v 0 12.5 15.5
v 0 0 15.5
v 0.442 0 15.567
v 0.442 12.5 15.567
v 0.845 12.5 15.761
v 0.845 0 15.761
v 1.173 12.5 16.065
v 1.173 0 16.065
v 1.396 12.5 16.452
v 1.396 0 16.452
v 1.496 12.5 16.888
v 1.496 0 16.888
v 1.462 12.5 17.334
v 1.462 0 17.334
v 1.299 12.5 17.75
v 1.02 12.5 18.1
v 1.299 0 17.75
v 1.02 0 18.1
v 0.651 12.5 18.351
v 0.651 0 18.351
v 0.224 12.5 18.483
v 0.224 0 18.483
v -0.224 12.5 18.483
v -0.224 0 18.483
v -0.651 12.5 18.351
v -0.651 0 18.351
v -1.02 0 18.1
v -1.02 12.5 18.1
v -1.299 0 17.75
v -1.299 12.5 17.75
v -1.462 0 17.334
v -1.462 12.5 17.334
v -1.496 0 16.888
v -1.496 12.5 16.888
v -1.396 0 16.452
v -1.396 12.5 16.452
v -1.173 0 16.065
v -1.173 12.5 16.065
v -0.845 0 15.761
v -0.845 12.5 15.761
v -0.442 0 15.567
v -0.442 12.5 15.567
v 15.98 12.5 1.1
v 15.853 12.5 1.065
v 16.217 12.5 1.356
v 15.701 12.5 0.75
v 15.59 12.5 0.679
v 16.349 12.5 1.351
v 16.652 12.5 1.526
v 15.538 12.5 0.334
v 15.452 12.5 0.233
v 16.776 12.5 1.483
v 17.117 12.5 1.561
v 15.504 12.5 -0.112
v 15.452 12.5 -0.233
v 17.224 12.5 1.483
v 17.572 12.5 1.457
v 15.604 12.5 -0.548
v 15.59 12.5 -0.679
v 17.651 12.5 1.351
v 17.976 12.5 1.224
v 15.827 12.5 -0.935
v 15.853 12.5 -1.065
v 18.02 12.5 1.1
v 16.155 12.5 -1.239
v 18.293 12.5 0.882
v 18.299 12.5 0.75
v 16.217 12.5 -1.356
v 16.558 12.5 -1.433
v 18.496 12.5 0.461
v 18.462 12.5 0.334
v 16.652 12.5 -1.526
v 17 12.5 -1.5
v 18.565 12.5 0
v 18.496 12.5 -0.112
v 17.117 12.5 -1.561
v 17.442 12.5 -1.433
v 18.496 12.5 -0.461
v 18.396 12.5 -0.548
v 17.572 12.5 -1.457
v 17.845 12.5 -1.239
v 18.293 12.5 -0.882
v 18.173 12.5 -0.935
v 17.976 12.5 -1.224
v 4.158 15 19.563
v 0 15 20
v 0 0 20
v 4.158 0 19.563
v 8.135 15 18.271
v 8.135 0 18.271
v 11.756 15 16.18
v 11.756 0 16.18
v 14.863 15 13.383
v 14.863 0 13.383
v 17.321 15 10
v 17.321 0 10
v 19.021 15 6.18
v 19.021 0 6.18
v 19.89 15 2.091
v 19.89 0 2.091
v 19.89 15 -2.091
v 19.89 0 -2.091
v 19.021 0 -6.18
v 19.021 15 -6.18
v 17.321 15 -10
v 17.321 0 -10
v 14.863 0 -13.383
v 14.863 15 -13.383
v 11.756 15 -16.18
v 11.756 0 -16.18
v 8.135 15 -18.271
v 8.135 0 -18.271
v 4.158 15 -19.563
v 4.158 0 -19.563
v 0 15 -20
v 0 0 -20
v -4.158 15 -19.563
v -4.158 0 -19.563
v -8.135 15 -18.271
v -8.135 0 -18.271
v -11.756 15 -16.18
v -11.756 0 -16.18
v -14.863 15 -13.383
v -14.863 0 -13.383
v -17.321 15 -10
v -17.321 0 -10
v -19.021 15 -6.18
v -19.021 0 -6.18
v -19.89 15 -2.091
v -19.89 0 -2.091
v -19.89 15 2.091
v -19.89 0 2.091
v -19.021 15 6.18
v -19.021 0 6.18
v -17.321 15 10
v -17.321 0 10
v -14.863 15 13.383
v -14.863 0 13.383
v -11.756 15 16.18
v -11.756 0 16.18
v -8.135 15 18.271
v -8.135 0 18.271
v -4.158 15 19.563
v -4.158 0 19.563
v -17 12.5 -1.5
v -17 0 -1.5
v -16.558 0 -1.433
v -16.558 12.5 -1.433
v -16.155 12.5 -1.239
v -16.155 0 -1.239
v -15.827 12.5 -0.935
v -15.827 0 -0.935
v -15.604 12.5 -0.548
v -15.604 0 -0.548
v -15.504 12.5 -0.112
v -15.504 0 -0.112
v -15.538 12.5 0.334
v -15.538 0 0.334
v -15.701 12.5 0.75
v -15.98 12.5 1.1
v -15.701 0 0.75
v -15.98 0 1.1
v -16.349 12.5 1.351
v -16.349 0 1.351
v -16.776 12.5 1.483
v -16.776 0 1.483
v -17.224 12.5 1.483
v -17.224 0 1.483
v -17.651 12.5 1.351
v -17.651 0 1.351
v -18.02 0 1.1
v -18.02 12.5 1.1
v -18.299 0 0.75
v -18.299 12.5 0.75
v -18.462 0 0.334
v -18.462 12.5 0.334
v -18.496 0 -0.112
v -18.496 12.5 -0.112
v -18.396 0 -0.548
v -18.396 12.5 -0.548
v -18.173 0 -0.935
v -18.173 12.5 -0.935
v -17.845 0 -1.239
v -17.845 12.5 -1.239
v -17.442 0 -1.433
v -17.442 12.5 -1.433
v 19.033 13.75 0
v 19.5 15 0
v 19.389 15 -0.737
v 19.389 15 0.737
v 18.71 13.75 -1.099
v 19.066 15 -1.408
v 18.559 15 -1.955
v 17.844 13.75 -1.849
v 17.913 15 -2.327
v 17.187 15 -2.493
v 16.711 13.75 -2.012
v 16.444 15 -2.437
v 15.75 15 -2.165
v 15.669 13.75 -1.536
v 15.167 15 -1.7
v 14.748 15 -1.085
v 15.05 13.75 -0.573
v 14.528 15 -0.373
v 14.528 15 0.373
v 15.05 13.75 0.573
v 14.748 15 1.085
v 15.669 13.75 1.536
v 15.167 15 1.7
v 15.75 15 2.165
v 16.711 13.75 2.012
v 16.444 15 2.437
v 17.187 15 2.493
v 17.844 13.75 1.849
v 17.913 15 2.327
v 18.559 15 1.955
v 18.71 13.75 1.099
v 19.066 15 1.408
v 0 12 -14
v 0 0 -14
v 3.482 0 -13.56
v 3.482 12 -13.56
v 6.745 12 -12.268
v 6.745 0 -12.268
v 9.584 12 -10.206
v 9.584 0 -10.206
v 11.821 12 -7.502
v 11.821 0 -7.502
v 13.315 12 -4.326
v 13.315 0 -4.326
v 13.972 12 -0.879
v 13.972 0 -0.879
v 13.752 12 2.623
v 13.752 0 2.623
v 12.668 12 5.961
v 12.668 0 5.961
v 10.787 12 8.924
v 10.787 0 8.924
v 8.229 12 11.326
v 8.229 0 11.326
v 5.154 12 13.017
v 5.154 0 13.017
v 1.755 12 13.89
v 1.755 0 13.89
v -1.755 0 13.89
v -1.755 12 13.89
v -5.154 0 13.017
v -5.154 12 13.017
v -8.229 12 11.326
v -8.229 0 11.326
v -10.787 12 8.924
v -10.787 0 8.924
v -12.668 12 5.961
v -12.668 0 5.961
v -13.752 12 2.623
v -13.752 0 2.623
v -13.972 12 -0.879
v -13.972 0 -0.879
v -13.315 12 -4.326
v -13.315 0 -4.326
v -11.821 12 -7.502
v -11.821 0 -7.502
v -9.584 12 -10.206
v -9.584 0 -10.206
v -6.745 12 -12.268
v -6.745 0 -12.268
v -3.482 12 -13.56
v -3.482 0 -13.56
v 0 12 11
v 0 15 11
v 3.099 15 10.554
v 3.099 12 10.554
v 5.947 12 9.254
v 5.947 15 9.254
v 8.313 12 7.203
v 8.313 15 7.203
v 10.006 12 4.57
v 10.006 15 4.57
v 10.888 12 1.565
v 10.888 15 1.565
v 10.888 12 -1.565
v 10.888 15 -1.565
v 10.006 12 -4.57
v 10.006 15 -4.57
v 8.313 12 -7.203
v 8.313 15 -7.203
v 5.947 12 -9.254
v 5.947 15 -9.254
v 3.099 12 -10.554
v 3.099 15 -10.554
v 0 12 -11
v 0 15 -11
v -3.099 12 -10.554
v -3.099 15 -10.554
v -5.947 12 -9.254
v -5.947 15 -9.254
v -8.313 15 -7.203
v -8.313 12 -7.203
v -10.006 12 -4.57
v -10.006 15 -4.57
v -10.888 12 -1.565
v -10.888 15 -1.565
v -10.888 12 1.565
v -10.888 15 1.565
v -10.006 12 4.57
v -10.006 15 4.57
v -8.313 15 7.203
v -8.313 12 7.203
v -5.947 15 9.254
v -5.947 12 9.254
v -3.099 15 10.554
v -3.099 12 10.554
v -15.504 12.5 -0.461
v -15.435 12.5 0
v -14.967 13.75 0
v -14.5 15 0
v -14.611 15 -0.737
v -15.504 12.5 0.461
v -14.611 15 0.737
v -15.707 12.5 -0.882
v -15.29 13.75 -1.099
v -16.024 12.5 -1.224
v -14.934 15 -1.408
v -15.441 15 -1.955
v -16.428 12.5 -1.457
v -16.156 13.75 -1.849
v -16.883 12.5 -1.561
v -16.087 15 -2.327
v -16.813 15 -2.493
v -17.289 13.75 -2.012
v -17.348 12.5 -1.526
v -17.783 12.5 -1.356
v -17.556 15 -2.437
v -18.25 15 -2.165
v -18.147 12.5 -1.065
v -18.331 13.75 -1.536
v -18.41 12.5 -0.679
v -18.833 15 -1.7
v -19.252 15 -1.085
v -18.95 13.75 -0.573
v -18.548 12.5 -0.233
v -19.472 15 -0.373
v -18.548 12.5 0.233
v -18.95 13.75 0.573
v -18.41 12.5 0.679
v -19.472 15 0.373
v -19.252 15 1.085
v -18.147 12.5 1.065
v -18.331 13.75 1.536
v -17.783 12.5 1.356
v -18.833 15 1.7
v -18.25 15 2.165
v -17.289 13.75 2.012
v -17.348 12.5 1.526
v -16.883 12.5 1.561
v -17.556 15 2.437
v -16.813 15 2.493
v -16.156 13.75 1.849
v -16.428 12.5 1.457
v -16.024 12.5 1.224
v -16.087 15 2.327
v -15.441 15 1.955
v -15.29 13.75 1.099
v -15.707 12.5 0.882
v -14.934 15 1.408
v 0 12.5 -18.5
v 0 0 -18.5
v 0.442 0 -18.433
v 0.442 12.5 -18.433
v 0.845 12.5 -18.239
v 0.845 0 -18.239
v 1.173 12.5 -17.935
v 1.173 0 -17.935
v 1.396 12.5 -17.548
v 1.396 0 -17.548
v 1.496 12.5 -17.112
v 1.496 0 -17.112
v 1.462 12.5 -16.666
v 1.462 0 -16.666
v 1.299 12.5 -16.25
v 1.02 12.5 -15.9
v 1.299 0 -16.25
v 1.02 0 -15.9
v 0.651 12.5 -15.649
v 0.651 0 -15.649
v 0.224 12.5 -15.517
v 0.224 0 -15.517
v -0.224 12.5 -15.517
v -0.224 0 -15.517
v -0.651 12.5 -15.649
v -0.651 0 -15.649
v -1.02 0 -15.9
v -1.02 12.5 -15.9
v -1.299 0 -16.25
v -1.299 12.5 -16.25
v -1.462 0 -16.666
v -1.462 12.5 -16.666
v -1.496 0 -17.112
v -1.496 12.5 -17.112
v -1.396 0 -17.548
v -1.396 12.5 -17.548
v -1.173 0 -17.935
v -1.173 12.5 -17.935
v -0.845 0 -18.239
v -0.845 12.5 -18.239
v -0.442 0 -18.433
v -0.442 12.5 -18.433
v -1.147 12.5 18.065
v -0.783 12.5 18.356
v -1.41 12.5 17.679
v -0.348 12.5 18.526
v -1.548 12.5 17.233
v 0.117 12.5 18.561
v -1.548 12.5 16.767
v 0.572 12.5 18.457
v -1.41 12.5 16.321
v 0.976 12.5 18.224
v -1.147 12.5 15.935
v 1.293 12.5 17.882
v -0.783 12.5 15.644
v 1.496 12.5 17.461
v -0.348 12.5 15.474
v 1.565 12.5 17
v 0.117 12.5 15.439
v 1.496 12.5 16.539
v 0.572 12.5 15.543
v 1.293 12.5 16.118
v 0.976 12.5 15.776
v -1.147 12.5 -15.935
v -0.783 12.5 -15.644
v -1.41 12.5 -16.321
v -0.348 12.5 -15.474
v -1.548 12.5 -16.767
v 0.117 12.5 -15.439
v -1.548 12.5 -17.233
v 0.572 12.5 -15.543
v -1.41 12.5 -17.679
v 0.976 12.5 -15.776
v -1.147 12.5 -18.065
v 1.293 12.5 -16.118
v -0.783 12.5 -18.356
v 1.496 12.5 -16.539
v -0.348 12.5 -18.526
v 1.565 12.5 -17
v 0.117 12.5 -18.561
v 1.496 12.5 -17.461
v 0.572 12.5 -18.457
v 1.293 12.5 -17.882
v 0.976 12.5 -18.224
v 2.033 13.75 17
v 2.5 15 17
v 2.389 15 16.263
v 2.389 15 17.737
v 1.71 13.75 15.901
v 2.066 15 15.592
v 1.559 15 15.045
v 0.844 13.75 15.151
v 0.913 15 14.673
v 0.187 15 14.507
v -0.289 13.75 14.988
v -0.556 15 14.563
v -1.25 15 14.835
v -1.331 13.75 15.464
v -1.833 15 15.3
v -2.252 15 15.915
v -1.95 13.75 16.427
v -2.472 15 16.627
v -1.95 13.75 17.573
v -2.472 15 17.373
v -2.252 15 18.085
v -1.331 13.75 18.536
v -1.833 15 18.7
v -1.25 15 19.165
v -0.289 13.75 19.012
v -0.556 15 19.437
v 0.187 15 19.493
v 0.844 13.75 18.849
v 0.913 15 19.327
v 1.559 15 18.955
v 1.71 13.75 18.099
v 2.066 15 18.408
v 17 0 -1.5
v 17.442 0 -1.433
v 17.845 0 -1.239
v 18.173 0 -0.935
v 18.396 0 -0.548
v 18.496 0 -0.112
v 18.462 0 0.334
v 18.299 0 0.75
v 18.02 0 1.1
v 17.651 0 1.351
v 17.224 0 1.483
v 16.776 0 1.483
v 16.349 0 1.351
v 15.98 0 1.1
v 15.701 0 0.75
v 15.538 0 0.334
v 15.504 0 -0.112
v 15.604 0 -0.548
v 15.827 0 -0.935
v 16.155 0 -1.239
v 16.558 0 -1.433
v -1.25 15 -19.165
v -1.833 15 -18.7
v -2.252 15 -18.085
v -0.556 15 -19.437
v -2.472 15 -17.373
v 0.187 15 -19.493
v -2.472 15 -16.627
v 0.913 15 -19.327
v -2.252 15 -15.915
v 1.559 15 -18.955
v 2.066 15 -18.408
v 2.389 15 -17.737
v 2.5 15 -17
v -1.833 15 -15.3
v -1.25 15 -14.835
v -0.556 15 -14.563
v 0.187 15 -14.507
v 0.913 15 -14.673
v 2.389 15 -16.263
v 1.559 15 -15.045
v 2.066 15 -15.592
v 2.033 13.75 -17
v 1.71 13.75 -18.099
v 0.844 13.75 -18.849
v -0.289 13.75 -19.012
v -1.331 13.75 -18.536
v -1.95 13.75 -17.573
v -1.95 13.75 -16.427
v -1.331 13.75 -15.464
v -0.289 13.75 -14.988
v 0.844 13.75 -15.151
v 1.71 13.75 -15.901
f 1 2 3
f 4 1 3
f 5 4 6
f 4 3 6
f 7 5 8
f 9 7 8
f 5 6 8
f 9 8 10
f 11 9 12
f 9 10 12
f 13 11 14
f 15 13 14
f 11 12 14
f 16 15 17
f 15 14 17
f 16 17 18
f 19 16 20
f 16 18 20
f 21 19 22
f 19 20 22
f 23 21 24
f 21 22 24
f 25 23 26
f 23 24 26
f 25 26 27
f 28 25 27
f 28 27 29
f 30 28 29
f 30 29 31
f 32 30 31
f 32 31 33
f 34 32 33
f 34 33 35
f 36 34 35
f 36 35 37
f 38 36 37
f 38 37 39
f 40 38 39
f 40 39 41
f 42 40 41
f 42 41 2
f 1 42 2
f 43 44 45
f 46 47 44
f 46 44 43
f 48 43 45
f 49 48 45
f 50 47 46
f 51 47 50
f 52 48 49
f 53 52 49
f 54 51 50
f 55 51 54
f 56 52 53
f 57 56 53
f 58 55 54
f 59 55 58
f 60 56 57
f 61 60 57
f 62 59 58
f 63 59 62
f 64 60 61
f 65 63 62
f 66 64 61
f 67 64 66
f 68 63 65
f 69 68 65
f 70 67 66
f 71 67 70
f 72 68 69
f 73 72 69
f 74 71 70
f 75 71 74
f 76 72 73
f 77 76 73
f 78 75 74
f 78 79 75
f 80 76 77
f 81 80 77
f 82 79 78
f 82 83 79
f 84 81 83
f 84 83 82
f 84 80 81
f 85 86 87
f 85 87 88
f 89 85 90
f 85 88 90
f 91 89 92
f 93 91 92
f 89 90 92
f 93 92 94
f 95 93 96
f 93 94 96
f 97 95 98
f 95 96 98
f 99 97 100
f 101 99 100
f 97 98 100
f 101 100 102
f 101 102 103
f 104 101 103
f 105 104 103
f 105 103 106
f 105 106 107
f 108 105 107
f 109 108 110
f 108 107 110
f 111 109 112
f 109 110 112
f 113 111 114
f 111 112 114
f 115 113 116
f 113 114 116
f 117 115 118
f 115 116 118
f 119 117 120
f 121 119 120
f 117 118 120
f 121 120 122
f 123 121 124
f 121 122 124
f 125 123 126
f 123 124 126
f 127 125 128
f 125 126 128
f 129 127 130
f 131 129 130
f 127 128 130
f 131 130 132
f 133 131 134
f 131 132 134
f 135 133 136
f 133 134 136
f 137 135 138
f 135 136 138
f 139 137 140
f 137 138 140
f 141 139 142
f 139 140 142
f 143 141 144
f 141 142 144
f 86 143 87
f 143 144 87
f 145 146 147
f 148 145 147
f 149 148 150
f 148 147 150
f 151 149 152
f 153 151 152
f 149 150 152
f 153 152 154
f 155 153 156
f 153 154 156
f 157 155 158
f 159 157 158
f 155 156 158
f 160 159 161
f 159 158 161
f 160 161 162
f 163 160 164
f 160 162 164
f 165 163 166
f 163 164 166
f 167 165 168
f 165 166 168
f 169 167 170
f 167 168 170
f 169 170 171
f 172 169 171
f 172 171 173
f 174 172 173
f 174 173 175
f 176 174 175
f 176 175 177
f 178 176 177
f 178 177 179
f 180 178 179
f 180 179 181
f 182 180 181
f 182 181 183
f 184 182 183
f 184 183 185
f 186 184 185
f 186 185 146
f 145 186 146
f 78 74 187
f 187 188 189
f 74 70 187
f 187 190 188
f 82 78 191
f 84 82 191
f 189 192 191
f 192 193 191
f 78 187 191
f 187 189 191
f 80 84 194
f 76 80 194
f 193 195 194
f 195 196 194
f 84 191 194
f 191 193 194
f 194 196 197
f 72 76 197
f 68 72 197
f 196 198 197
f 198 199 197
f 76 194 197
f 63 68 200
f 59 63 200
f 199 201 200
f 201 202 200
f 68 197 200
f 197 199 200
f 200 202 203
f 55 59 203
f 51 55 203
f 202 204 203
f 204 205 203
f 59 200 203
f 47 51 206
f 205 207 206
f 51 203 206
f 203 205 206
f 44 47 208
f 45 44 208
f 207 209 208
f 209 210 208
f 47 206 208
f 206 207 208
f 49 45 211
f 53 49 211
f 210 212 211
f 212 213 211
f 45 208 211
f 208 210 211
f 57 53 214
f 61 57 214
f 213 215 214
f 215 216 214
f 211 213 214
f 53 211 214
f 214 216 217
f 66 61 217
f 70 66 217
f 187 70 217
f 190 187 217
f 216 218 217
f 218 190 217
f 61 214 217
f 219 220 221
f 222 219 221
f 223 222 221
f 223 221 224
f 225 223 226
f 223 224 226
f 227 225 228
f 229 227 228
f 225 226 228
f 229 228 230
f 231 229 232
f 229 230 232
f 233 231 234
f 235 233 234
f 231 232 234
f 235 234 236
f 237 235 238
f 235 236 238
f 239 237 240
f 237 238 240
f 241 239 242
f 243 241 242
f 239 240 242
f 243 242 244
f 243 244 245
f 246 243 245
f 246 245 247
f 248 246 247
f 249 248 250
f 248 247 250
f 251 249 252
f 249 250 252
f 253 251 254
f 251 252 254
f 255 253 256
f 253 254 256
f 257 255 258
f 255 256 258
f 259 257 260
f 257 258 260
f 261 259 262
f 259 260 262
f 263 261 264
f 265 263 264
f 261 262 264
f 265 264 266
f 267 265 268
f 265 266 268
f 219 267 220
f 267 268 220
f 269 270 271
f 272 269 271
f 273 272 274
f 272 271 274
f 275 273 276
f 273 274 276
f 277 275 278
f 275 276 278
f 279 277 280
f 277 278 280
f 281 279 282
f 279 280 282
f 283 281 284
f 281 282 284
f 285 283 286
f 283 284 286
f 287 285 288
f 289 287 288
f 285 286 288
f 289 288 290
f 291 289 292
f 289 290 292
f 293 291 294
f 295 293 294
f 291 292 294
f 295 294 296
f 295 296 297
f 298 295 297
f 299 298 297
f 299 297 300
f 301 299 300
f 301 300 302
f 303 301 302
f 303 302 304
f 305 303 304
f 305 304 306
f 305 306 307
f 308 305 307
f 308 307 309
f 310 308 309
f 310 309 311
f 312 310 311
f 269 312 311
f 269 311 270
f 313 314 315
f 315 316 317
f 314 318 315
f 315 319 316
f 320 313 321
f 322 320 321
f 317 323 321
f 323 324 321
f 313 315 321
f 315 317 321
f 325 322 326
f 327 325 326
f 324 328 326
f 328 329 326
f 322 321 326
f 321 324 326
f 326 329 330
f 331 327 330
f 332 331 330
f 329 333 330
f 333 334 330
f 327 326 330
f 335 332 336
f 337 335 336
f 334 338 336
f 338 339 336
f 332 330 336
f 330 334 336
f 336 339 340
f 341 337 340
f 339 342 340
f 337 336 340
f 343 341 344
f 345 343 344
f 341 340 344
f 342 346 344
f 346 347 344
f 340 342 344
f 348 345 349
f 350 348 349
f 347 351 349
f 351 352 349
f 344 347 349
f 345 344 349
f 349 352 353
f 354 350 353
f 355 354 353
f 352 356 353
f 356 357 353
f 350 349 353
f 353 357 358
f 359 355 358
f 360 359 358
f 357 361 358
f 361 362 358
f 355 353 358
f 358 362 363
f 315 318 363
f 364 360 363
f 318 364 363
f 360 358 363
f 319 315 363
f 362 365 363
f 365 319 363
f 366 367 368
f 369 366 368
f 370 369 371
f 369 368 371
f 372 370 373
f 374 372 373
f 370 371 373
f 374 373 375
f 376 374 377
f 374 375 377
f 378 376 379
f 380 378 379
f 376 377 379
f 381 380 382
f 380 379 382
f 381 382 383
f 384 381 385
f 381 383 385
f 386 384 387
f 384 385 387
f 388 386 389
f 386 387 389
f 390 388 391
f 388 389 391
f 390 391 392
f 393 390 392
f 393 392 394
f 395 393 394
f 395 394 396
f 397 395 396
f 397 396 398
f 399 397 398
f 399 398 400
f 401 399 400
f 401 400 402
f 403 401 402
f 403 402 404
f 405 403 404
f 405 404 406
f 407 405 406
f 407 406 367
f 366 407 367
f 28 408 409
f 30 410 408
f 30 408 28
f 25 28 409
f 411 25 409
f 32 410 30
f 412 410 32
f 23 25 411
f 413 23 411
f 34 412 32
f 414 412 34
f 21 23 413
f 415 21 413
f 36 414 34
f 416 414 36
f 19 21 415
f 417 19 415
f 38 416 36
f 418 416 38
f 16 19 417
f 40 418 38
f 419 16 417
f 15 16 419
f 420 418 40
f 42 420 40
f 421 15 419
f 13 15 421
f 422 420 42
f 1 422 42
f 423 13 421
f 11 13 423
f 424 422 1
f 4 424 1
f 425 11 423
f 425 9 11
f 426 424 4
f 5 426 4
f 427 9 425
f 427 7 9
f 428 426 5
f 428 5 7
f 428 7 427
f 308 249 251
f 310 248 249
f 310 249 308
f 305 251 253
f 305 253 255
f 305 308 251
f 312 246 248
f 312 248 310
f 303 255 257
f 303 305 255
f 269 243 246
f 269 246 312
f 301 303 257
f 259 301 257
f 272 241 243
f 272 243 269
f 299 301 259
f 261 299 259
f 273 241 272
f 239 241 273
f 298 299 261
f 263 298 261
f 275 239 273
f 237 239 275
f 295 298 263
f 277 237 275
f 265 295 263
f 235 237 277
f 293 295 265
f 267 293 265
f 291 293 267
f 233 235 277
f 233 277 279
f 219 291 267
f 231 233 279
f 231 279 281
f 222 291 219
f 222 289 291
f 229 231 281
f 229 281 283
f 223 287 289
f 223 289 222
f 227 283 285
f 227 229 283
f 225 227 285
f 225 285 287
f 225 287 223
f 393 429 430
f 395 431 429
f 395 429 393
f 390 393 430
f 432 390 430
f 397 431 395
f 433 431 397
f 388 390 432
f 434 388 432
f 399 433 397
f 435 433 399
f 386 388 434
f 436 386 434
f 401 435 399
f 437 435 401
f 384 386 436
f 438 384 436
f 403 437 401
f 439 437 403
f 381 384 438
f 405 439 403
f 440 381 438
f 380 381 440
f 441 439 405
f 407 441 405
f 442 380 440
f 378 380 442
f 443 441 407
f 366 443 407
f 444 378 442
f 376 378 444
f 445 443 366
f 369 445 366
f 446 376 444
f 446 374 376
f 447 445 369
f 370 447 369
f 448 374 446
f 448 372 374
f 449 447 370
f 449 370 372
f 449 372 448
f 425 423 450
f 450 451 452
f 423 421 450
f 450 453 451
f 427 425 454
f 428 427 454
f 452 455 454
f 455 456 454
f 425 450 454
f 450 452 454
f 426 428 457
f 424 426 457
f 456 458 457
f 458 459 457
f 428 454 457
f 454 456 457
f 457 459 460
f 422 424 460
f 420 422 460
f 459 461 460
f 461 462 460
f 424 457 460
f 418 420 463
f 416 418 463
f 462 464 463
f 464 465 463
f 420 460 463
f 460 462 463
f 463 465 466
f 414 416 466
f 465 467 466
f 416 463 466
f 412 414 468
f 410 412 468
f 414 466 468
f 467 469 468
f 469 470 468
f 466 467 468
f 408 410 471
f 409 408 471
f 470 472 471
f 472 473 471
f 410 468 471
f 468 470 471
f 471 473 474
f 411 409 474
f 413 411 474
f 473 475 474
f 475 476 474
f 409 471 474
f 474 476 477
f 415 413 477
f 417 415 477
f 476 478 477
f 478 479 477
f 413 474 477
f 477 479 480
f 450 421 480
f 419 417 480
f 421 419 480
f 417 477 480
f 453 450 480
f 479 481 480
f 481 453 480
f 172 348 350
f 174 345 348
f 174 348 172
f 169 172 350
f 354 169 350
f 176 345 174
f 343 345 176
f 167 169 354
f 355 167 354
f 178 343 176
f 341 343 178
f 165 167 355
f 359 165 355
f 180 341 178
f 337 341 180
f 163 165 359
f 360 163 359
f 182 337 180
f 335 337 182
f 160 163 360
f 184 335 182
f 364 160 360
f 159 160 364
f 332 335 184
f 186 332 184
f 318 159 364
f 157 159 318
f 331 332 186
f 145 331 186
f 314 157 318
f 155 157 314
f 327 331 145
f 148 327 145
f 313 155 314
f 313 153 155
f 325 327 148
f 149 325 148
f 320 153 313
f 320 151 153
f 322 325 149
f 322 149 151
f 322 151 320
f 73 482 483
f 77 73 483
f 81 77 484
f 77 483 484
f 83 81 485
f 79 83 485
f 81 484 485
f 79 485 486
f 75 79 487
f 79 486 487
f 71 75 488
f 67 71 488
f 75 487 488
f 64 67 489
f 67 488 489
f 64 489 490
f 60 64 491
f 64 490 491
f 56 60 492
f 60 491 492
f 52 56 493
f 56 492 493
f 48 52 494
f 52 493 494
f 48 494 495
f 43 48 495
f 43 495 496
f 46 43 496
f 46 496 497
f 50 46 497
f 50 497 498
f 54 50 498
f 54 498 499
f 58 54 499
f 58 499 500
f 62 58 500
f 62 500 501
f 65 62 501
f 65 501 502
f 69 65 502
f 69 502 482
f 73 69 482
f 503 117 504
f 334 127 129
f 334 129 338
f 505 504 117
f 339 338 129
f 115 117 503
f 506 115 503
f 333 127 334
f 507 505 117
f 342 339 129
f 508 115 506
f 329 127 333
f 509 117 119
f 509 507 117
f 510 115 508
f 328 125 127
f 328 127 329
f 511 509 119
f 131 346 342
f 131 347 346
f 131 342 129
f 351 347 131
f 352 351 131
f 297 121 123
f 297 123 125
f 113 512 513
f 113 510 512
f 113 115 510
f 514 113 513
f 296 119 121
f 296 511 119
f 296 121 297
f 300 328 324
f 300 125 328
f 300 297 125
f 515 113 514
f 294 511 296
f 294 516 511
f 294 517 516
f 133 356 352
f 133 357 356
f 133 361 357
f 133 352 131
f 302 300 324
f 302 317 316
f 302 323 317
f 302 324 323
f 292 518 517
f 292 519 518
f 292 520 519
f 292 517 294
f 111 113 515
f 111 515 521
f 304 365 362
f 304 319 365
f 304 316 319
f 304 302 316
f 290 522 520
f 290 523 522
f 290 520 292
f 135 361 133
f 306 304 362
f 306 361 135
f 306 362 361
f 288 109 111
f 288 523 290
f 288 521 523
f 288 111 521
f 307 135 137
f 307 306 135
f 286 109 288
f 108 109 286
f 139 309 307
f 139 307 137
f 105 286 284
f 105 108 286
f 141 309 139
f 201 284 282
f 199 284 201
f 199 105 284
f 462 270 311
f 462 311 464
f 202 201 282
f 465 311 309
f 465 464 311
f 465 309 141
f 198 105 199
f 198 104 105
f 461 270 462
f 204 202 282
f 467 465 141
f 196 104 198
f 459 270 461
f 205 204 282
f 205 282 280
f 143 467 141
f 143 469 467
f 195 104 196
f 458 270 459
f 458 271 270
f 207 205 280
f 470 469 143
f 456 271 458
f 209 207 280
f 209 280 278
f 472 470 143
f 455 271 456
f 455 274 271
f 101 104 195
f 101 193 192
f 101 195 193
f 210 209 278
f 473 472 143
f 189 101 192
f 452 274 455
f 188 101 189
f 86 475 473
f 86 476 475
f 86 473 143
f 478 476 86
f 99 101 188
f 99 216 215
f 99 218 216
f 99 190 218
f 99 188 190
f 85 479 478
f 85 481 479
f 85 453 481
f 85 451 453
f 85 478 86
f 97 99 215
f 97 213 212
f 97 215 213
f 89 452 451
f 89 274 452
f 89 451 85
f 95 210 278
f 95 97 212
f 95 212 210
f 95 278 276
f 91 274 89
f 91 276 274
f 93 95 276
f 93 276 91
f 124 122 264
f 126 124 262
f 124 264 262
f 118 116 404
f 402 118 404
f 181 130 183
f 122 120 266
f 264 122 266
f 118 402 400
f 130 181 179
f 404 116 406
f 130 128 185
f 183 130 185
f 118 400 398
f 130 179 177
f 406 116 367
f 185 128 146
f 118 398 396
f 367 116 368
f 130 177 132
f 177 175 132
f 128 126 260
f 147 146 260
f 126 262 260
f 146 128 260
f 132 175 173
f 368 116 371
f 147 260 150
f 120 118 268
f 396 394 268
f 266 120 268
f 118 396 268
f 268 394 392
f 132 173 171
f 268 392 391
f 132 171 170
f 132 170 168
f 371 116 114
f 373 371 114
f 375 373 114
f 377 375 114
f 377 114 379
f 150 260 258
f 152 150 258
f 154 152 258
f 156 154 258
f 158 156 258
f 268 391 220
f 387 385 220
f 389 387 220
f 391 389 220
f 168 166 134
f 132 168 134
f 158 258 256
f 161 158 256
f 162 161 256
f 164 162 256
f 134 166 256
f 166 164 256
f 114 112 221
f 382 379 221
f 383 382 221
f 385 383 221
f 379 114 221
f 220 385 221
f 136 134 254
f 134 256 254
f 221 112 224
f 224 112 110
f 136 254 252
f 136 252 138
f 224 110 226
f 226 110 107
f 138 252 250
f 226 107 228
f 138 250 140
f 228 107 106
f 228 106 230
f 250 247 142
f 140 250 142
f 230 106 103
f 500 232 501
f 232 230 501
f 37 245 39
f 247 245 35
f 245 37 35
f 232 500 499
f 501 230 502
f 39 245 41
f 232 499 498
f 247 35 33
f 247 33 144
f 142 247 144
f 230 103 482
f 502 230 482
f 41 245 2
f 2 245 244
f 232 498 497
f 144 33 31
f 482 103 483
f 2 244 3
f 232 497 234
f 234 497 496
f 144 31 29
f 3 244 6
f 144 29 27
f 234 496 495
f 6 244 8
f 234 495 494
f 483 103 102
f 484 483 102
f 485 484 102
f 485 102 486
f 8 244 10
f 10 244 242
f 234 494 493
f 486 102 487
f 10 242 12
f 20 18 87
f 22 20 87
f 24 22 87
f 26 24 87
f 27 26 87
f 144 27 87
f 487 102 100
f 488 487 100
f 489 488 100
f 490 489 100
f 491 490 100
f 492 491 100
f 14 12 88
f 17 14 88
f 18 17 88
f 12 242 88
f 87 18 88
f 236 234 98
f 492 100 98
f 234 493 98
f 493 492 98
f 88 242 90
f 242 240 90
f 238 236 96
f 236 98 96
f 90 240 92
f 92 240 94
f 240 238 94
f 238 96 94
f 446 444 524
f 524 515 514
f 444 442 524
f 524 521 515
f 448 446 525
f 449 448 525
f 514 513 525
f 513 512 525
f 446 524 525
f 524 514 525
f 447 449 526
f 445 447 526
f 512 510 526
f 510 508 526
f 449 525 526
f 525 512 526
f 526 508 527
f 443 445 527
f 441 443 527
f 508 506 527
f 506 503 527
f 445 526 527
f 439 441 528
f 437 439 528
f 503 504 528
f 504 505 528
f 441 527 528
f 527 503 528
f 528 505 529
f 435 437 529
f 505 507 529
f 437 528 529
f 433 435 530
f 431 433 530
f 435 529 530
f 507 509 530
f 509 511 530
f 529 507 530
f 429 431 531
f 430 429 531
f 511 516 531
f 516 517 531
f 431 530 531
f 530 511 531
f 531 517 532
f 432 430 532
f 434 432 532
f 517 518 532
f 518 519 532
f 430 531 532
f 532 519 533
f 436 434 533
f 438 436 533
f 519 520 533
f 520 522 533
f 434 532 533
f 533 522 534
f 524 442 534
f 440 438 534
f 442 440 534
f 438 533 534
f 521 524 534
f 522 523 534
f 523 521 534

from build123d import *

# Parameters (mm, degrees)
SKETCH1_R                    = 20
BOSS_EXTRUDE1_DEPTH          = 15
SKETCH2_R                    = 1.5
CUT_EXTRUDE1_DEPTH           = 20
SKETCH3_R                    = 2.5
CUT_EXTRUDE2_DEPTH           = 2.5
CUT_EXTRUDE2_DRAFT           = -20.5
CUT_EXTRUDE2_PROFILE_2_DEPTH = 2.5
CUT_EXTRUDE2_PROFILE_2_DRAFT = -20.5
CUT_EXTRUDE2_PROFILE_3_DEPTH = 2.5
CUT_EXTRUDE2_PROFILE_3_DRAFT = -20.5
CUT_EXTRUDE2_PROFILE_4_DEPTH = 2.5
CUT_EXTRUDE2_PROFILE_4_DRAFT = -20.5
SKETCH4_R                    = 14
CUT_EXTRUDE3_DEPTH           = 12
SKETCH5_R                    = 11
CUT_EXTRUDE4_DEPTH           = 12


with BuildPart() as part:
    # Sketch1 → Boss-Extrude1 (new body)
    with BuildSketch(Plane(origin=(0, 0, 0), x_dir=(1, 0, 0), z_dir=(0, 1, 0))):
        with Locations(Location((0, 0, 0), (0, 0, 270))):
            Circle(SKETCH1_R)
    extrude(amount=BOSS_EXTRUDE1_DEPTH)

    # Sketch2 → Cut-Extrude1 (cut)
    with BuildSketch(Plane(origin=(0, 0, 0), x_dir=(-1, 0, 0), z_dir=(0, -1, 0))):
        with Locations(Location((0, -17, 0), (0, 0, 90))):
            Circle(SKETCH2_R)
        with Locations(Location((-17, 0, 0), (0, 0, 90))):
            Circle(SKETCH2_R)
        with Locations(Location((0, 17, 0), (0, 0, 90))):
            Circle(SKETCH2_R)
        with Locations(Location((17, 0, 0), (0, 0, 90))):
            Circle(SKETCH2_R)
    extrude(amount=-CUT_EXTRUDE1_DEPTH, mode=Mode.SUBTRACT)


with BuildPart() as cut_extrude2_tool:
    # Sketch3 → Cut-Extrude2 (with draft: the straight prism first)
    with BuildSketch(Plane(origin=(0, 15, 0), x_dir=(1, 0, 0), z_dir=(0, 1, 0))):
        with Locations((0, 17)):
            Circle(SKETCH3_R)
    extrude(amount=-CUT_EXTRUDE2_DEPTH)
    # Cut-Extrude2: the draft: its side faces are tilted about the plane it starts from
    cut_extrude2_sides = [cut_extrude2_tool.faces().sort_by_distance(p)[0] for p in [
        (-2.5, 13.75, -17),
    ]]
    draft(cut_extrude2_sides, Plane(origin=(0, 15, 0), x_dir=(1, 0, 0), z_dir=(0, 1, 0)), CUT_EXTRUDE2_DRAFT)


with BuildPart() as part_1:
    add(part.part)

    # Cut-Extrude2: cut by cut_extrude2_tool
    add(cut_extrude2_tool.part, mode=Mode.SUBTRACT)


with BuildPart() as cut_extrude2_profile_2_tool:
    # Sketch3 → Cut-Extrude2 profile 2 (with draft: the straight prism first)
    with BuildSketch(Plane(origin=(0, 15, 0), x_dir=(1, 0, 0), z_dir=(0, 1, 0))):
        with Locations((17, 0)):
            Circle(SKETCH3_R)
    extrude(amount=-CUT_EXTRUDE2_PROFILE_2_DEPTH)
    # Cut-Extrude2 profile 2: the draft: its side faces are tilted about the plane it starts from
    cut_extrude2_profile_2_sides = [cut_extrude2_profile_2_tool.faces().sort_by_distance(p)[0] for p in [
        (14.5, 13.75, 0),
    ]]
    draft(cut_extrude2_profile_2_sides, Plane(origin=(0, 15, 0), x_dir=(1, 0, 0), z_dir=(0, 1, 0)), CUT_EXTRUDE2_PROFILE_2_DRAFT)


with BuildPart() as part_2:
    add(part_1.part)

    # Cut-Extrude2 profile 2: cut by cut_extrude2_profile_2_tool
    add(cut_extrude2_profile_2_tool.part, mode=Mode.SUBTRACT)


with BuildPart() as cut_extrude2_profile_3_tool:
    # Sketch3 → Cut-Extrude2 profile 3 (with draft: the straight prism first)
    with BuildSketch(Plane(origin=(0, 15, 0), x_dir=(1, 0, 0), z_dir=(0, 1, 0))):
        with Locations((0, -17)):
            Circle(SKETCH3_R)
    extrude(amount=-CUT_EXTRUDE2_PROFILE_3_DEPTH)
    # Cut-Extrude2 profile 3: the draft: its side faces are tilted about the plane it starts from
    cut_extrude2_profile_3_sides = [cut_extrude2_profile_3_tool.faces().sort_by_distance(p)[0] for p in [
        (-2.5, 13.75, 17),
    ]]
    draft(cut_extrude2_profile_3_sides, Plane(origin=(0, 15, 0), x_dir=(1, 0, 0), z_dir=(0, 1, 0)), CUT_EXTRUDE2_PROFILE_3_DRAFT)


with BuildPart() as part_3:
    add(part_2.part)

    # Cut-Extrude2 profile 3: cut by cut_extrude2_profile_3_tool
    add(cut_extrude2_profile_3_tool.part, mode=Mode.SUBTRACT)


with BuildPart() as cut_extrude2_profile_4_tool:
    # Sketch3 → Cut-Extrude2 profile 4 (with draft: the straight prism first)
    with BuildSketch(Plane(origin=(0, 15, 0), x_dir=(1, 0, 0), z_dir=(0, 1, 0))):
        with Locations((-17, 0)):
            Circle(SKETCH3_R)
    extrude(amount=-CUT_EXTRUDE2_PROFILE_4_DEPTH)
    # Cut-Extrude2 profile 4: the draft: its side faces are tilted about the plane it starts from
    cut_extrude2_profile_4_sides = [cut_extrude2_profile_4_tool.faces().sort_by_distance(p)[0] for p in [
        (-19.5, 13.75, 0),
    ]]
    draft(cut_extrude2_profile_4_sides, Plane(origin=(0, 15, 0), x_dir=(1, 0, 0), z_dir=(0, 1, 0)), CUT_EXTRUDE2_PROFILE_4_DRAFT)


with BuildPart() as part_4:
    add(part_3.part)

    # Cut-Extrude2 profile 4: cut by cut_extrude2_profile_4_tool
    add(cut_extrude2_profile_4_tool.part, mode=Mode.SUBTRACT)

    # Sketch4 → Cut-Extrude3 (cut)
    with BuildSketch(Plane.XZ):
        with Locations(Location((0, 0, 0), (0, 0, 270))):
            Circle(SKETCH4_R)
    extrude(amount=-CUT_EXTRUDE3_DEPTH, mode=Mode.SUBTRACT)

    # Sketch5 → Cut-Extrude4 (cut)
    with BuildSketch(Plane(origin=(0, 15, 0), x_dir=(1, 0, 0), z_dir=(0, 1, 0))):
        with Locations(Location((0, 0, 0), (0, 0, 270))):
            Circle(SKETCH5_R)
    extrude(amount=-CUT_EXTRUDE4_DEPTH, mode=Mode.SUBTRACT)


solid = part_4.part
